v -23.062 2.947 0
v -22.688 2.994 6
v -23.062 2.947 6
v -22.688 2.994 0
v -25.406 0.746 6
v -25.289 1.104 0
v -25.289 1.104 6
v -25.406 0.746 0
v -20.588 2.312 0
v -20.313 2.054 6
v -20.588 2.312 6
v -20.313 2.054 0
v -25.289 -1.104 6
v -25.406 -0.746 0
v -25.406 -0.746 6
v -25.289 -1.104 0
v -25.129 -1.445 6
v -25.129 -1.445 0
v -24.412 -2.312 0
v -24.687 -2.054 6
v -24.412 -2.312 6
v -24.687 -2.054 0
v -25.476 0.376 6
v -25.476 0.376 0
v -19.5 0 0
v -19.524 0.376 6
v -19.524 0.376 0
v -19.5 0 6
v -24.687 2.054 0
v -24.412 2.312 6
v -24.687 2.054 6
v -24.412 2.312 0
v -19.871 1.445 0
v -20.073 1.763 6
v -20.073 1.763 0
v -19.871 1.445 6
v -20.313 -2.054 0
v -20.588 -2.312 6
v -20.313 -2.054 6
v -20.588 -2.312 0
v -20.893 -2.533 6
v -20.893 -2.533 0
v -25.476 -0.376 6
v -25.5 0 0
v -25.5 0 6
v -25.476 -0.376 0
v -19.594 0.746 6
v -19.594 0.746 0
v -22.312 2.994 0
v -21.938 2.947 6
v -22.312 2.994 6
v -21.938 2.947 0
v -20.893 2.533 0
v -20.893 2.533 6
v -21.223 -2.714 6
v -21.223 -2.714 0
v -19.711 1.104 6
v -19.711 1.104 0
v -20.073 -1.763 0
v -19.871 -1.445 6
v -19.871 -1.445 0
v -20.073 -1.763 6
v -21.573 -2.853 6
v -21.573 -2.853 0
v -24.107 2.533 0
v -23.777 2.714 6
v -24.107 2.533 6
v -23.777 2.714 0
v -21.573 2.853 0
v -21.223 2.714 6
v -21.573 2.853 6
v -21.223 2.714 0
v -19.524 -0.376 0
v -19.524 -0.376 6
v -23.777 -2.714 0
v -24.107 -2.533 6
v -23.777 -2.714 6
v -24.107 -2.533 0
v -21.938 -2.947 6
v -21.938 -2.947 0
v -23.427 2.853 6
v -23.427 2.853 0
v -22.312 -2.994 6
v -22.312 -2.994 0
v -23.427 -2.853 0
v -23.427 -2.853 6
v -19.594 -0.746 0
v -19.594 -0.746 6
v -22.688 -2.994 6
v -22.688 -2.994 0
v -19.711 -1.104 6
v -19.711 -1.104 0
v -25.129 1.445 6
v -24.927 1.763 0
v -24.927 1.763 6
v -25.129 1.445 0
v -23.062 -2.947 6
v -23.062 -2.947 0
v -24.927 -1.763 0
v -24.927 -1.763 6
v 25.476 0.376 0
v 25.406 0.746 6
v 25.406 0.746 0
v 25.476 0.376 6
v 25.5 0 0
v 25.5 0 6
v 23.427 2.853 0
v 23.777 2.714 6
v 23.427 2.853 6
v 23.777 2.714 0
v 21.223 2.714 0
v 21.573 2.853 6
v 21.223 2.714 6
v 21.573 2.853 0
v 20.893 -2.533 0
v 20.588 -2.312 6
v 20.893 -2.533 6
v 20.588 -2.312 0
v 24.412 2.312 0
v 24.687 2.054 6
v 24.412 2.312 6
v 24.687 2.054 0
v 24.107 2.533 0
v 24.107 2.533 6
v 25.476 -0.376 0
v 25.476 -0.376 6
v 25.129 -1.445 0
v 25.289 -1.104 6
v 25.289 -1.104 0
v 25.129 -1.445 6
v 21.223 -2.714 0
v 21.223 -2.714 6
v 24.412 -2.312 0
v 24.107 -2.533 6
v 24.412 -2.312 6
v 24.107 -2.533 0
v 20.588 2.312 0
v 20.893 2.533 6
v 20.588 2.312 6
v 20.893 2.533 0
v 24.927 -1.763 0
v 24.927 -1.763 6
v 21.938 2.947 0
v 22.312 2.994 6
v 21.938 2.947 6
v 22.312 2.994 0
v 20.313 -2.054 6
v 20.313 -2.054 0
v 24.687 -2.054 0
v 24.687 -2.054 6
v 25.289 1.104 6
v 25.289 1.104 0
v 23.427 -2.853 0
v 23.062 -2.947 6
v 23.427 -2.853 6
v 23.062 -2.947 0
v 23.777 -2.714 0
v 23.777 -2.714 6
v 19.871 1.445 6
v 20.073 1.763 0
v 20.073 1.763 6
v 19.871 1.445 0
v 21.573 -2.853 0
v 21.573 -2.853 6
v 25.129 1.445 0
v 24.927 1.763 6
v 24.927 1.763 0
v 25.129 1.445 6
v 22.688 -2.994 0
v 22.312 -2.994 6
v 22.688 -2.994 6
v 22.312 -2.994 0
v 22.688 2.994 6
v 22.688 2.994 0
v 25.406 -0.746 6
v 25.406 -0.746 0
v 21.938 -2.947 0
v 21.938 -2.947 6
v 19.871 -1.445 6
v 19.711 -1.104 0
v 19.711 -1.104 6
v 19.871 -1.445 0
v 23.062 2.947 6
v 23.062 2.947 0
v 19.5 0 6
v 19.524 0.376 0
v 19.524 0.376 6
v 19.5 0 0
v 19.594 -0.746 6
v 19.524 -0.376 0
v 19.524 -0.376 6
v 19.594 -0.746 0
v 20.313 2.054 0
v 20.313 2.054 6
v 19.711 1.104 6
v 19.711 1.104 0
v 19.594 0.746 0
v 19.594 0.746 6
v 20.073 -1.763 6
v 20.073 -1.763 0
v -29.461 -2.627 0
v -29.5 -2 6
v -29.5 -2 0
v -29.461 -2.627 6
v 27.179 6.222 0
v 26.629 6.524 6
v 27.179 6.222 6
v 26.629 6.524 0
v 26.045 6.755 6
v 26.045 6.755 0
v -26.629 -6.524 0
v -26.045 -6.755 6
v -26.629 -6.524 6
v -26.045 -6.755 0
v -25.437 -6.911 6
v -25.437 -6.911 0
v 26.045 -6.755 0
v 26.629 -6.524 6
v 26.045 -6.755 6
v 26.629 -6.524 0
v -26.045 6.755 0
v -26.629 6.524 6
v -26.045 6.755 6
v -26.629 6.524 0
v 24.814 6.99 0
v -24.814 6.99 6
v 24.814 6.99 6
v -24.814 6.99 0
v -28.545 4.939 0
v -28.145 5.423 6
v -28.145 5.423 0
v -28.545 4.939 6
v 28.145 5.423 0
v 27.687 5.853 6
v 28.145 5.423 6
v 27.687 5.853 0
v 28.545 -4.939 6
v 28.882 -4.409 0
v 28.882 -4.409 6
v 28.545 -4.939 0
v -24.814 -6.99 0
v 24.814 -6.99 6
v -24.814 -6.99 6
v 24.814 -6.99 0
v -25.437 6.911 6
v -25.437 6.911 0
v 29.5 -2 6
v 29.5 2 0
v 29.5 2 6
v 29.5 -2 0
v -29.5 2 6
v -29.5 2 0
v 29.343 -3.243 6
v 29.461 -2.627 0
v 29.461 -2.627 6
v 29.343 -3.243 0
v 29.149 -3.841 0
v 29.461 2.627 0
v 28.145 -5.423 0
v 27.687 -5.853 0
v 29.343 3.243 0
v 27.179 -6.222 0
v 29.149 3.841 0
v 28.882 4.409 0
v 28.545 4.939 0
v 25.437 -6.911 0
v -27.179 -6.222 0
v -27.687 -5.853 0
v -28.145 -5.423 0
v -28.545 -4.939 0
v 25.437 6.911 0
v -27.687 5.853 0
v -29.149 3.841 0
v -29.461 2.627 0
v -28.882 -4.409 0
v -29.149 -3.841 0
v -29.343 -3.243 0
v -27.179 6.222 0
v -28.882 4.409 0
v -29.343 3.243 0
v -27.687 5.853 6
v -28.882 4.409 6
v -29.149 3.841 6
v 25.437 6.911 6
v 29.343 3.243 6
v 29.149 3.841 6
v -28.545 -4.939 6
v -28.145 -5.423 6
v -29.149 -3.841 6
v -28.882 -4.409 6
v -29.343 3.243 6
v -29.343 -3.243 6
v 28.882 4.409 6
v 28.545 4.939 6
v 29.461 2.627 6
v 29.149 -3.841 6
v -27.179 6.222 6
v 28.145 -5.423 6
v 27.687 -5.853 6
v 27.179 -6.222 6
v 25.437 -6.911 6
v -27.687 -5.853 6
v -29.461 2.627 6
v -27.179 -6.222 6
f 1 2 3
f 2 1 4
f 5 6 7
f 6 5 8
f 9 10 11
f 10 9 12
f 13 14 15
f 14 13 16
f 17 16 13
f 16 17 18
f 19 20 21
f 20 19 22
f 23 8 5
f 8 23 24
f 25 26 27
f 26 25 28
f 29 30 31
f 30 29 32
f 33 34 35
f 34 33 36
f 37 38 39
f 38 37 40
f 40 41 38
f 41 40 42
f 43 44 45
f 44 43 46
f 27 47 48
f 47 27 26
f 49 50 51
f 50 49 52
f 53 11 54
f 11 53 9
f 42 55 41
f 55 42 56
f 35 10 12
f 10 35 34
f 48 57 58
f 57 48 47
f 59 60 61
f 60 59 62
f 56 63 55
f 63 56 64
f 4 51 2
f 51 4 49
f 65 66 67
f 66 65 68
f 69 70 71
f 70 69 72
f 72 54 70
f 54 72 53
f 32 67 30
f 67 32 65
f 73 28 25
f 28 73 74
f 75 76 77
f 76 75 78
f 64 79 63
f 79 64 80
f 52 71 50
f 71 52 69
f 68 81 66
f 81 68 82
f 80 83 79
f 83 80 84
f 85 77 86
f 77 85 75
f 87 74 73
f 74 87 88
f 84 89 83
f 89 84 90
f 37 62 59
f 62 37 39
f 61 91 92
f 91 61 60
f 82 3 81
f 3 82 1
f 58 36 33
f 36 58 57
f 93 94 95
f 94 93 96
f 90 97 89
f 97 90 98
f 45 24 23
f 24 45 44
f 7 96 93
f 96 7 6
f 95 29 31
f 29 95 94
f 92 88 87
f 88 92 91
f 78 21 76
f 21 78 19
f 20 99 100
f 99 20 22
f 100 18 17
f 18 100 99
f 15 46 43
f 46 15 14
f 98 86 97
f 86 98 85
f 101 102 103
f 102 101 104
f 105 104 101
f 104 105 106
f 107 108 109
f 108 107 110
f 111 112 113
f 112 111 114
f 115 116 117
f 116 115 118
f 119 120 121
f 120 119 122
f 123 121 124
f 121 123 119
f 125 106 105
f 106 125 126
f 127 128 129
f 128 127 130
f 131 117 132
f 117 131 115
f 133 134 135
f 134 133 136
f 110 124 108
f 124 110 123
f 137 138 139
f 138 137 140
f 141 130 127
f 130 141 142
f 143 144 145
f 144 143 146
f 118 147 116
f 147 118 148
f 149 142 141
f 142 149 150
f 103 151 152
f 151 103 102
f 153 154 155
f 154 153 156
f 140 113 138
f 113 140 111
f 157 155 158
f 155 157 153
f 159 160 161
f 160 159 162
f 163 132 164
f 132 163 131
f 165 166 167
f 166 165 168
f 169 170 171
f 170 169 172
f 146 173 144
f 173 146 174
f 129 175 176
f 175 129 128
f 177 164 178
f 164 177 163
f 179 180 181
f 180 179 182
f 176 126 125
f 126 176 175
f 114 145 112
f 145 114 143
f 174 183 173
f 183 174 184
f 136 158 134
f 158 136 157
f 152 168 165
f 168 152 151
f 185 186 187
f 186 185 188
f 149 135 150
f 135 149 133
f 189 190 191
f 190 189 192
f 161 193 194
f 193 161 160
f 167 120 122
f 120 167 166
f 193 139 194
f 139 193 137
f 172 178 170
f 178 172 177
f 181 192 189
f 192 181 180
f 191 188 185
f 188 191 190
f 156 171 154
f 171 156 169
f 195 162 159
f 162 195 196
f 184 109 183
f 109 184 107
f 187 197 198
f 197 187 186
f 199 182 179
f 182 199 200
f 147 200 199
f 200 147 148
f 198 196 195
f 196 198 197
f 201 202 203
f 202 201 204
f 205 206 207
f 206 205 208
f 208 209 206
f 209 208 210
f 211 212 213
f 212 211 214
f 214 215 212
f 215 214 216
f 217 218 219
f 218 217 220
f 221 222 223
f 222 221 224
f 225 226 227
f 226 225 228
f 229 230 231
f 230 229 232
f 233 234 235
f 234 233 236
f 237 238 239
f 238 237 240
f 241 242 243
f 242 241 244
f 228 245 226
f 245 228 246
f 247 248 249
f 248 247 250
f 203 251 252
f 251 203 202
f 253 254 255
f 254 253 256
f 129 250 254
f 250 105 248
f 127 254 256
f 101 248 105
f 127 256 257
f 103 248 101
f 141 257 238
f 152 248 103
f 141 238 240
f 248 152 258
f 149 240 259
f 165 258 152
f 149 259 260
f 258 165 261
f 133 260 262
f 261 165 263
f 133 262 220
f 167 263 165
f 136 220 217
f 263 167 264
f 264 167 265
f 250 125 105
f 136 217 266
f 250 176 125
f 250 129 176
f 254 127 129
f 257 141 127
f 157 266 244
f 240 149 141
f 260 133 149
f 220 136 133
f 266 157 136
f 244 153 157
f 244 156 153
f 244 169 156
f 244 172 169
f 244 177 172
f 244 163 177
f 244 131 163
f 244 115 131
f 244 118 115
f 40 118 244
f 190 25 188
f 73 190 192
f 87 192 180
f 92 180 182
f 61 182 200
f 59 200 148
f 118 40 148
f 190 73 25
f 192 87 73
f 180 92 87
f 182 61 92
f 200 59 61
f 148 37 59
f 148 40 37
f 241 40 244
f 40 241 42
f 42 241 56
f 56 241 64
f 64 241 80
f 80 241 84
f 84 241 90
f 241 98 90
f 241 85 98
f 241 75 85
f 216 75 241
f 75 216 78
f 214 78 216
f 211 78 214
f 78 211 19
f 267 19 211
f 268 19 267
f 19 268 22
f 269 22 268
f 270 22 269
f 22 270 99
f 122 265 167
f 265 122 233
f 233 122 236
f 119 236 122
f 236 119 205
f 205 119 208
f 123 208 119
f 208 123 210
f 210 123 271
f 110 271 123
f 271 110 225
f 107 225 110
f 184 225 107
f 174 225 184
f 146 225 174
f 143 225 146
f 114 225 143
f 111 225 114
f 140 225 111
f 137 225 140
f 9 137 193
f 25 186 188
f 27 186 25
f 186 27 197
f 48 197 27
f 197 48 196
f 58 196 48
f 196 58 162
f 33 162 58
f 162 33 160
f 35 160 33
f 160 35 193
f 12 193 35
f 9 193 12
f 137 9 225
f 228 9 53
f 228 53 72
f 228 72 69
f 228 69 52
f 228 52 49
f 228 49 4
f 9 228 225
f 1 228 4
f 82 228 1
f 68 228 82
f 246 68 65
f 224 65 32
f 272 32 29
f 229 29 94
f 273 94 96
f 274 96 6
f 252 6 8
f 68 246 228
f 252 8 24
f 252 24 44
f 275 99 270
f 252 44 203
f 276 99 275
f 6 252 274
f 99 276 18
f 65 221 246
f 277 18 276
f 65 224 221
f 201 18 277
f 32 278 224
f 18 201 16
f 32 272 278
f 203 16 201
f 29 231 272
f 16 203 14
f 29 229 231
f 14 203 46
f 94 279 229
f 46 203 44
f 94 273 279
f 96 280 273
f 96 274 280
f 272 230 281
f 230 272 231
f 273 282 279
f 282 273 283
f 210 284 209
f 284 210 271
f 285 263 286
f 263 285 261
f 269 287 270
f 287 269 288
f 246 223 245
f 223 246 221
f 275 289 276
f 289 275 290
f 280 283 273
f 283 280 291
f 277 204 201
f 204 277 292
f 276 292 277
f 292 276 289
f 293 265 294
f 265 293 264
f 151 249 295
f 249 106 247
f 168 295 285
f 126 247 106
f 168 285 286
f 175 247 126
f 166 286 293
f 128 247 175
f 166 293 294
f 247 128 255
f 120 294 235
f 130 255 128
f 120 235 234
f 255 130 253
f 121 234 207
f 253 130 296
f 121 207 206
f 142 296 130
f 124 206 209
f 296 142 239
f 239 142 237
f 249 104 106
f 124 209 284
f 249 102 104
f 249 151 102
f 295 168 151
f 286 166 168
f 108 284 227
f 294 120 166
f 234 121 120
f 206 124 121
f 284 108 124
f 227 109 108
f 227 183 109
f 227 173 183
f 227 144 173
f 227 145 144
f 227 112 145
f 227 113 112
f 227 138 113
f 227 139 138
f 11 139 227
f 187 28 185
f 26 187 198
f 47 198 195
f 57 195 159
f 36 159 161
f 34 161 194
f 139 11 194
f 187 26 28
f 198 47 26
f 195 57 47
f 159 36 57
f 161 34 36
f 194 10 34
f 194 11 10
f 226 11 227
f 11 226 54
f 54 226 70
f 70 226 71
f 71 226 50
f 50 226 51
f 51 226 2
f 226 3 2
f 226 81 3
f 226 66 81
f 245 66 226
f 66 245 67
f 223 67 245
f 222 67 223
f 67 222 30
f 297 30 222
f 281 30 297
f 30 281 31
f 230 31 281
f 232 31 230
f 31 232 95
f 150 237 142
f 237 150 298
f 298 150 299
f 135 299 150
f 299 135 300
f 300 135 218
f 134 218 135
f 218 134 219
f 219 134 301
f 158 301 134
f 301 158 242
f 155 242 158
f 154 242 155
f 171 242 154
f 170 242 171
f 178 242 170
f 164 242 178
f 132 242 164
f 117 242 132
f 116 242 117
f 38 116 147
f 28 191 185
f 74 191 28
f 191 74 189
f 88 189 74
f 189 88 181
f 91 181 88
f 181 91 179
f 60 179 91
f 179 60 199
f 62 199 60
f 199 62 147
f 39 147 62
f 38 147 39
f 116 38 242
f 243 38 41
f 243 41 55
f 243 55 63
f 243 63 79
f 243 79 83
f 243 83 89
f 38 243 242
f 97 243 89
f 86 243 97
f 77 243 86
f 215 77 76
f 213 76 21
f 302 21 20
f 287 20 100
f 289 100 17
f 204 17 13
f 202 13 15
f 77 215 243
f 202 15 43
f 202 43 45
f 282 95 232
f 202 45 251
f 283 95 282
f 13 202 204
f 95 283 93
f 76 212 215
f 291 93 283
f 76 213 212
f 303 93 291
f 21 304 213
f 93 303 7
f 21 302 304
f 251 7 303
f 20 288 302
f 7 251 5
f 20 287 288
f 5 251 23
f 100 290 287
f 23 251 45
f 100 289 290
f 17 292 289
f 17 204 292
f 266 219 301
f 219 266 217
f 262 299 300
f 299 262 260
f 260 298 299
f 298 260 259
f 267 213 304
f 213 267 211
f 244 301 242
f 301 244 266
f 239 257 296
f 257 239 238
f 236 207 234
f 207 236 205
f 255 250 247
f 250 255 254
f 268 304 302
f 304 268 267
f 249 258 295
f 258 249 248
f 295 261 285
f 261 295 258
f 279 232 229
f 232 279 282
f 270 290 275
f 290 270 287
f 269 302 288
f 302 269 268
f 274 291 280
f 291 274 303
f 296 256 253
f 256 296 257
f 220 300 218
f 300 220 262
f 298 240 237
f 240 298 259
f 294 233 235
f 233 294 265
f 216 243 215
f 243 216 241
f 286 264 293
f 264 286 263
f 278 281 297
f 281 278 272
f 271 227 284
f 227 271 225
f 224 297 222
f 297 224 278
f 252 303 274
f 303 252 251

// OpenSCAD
$fn = 50;


difference() {
	union() {
		hull() {
			translate(v = [-24.5000000000, 2.0000000000, 0]) {
				cylinder(h = 6, r = 5);
			}
			translate(v = [24.5000000000, 2.0000000000, 0]) {
				cylinder(h = 6, r = 5);
			}
			translate(v = [-24.5000000000, -2.0000000000, 0]) {
				cylinder(h = 6, r = 5);
			}
			translate(v = [24.5000000000, -2.0000000000, 0]) {
				cylinder(h = 6, r = 5);
			}
		}
	}
	union() {
		translate(v = [-22.5000000000, 0.0000000000, -100.0000000000]) {
			cylinder(h = 200, r = 3.0000000000);
		}
		translate(v = [-22.5000000000, 0.0000000000, -100.0000000000]) {
			cylinder(h = 200, r = 3.0000000000);
		}
		translate(v = [22.5000000000, 0.0000000000, -100.0000000000]) {
			cylinder(h = 200, r = 3.0000000000);
		}
		translate(v = [22.5000000000, 0.0000000000, -100.0000000000]) {
			cylinder(h = 200, r = 3.0000000000);
		}
	}
}
